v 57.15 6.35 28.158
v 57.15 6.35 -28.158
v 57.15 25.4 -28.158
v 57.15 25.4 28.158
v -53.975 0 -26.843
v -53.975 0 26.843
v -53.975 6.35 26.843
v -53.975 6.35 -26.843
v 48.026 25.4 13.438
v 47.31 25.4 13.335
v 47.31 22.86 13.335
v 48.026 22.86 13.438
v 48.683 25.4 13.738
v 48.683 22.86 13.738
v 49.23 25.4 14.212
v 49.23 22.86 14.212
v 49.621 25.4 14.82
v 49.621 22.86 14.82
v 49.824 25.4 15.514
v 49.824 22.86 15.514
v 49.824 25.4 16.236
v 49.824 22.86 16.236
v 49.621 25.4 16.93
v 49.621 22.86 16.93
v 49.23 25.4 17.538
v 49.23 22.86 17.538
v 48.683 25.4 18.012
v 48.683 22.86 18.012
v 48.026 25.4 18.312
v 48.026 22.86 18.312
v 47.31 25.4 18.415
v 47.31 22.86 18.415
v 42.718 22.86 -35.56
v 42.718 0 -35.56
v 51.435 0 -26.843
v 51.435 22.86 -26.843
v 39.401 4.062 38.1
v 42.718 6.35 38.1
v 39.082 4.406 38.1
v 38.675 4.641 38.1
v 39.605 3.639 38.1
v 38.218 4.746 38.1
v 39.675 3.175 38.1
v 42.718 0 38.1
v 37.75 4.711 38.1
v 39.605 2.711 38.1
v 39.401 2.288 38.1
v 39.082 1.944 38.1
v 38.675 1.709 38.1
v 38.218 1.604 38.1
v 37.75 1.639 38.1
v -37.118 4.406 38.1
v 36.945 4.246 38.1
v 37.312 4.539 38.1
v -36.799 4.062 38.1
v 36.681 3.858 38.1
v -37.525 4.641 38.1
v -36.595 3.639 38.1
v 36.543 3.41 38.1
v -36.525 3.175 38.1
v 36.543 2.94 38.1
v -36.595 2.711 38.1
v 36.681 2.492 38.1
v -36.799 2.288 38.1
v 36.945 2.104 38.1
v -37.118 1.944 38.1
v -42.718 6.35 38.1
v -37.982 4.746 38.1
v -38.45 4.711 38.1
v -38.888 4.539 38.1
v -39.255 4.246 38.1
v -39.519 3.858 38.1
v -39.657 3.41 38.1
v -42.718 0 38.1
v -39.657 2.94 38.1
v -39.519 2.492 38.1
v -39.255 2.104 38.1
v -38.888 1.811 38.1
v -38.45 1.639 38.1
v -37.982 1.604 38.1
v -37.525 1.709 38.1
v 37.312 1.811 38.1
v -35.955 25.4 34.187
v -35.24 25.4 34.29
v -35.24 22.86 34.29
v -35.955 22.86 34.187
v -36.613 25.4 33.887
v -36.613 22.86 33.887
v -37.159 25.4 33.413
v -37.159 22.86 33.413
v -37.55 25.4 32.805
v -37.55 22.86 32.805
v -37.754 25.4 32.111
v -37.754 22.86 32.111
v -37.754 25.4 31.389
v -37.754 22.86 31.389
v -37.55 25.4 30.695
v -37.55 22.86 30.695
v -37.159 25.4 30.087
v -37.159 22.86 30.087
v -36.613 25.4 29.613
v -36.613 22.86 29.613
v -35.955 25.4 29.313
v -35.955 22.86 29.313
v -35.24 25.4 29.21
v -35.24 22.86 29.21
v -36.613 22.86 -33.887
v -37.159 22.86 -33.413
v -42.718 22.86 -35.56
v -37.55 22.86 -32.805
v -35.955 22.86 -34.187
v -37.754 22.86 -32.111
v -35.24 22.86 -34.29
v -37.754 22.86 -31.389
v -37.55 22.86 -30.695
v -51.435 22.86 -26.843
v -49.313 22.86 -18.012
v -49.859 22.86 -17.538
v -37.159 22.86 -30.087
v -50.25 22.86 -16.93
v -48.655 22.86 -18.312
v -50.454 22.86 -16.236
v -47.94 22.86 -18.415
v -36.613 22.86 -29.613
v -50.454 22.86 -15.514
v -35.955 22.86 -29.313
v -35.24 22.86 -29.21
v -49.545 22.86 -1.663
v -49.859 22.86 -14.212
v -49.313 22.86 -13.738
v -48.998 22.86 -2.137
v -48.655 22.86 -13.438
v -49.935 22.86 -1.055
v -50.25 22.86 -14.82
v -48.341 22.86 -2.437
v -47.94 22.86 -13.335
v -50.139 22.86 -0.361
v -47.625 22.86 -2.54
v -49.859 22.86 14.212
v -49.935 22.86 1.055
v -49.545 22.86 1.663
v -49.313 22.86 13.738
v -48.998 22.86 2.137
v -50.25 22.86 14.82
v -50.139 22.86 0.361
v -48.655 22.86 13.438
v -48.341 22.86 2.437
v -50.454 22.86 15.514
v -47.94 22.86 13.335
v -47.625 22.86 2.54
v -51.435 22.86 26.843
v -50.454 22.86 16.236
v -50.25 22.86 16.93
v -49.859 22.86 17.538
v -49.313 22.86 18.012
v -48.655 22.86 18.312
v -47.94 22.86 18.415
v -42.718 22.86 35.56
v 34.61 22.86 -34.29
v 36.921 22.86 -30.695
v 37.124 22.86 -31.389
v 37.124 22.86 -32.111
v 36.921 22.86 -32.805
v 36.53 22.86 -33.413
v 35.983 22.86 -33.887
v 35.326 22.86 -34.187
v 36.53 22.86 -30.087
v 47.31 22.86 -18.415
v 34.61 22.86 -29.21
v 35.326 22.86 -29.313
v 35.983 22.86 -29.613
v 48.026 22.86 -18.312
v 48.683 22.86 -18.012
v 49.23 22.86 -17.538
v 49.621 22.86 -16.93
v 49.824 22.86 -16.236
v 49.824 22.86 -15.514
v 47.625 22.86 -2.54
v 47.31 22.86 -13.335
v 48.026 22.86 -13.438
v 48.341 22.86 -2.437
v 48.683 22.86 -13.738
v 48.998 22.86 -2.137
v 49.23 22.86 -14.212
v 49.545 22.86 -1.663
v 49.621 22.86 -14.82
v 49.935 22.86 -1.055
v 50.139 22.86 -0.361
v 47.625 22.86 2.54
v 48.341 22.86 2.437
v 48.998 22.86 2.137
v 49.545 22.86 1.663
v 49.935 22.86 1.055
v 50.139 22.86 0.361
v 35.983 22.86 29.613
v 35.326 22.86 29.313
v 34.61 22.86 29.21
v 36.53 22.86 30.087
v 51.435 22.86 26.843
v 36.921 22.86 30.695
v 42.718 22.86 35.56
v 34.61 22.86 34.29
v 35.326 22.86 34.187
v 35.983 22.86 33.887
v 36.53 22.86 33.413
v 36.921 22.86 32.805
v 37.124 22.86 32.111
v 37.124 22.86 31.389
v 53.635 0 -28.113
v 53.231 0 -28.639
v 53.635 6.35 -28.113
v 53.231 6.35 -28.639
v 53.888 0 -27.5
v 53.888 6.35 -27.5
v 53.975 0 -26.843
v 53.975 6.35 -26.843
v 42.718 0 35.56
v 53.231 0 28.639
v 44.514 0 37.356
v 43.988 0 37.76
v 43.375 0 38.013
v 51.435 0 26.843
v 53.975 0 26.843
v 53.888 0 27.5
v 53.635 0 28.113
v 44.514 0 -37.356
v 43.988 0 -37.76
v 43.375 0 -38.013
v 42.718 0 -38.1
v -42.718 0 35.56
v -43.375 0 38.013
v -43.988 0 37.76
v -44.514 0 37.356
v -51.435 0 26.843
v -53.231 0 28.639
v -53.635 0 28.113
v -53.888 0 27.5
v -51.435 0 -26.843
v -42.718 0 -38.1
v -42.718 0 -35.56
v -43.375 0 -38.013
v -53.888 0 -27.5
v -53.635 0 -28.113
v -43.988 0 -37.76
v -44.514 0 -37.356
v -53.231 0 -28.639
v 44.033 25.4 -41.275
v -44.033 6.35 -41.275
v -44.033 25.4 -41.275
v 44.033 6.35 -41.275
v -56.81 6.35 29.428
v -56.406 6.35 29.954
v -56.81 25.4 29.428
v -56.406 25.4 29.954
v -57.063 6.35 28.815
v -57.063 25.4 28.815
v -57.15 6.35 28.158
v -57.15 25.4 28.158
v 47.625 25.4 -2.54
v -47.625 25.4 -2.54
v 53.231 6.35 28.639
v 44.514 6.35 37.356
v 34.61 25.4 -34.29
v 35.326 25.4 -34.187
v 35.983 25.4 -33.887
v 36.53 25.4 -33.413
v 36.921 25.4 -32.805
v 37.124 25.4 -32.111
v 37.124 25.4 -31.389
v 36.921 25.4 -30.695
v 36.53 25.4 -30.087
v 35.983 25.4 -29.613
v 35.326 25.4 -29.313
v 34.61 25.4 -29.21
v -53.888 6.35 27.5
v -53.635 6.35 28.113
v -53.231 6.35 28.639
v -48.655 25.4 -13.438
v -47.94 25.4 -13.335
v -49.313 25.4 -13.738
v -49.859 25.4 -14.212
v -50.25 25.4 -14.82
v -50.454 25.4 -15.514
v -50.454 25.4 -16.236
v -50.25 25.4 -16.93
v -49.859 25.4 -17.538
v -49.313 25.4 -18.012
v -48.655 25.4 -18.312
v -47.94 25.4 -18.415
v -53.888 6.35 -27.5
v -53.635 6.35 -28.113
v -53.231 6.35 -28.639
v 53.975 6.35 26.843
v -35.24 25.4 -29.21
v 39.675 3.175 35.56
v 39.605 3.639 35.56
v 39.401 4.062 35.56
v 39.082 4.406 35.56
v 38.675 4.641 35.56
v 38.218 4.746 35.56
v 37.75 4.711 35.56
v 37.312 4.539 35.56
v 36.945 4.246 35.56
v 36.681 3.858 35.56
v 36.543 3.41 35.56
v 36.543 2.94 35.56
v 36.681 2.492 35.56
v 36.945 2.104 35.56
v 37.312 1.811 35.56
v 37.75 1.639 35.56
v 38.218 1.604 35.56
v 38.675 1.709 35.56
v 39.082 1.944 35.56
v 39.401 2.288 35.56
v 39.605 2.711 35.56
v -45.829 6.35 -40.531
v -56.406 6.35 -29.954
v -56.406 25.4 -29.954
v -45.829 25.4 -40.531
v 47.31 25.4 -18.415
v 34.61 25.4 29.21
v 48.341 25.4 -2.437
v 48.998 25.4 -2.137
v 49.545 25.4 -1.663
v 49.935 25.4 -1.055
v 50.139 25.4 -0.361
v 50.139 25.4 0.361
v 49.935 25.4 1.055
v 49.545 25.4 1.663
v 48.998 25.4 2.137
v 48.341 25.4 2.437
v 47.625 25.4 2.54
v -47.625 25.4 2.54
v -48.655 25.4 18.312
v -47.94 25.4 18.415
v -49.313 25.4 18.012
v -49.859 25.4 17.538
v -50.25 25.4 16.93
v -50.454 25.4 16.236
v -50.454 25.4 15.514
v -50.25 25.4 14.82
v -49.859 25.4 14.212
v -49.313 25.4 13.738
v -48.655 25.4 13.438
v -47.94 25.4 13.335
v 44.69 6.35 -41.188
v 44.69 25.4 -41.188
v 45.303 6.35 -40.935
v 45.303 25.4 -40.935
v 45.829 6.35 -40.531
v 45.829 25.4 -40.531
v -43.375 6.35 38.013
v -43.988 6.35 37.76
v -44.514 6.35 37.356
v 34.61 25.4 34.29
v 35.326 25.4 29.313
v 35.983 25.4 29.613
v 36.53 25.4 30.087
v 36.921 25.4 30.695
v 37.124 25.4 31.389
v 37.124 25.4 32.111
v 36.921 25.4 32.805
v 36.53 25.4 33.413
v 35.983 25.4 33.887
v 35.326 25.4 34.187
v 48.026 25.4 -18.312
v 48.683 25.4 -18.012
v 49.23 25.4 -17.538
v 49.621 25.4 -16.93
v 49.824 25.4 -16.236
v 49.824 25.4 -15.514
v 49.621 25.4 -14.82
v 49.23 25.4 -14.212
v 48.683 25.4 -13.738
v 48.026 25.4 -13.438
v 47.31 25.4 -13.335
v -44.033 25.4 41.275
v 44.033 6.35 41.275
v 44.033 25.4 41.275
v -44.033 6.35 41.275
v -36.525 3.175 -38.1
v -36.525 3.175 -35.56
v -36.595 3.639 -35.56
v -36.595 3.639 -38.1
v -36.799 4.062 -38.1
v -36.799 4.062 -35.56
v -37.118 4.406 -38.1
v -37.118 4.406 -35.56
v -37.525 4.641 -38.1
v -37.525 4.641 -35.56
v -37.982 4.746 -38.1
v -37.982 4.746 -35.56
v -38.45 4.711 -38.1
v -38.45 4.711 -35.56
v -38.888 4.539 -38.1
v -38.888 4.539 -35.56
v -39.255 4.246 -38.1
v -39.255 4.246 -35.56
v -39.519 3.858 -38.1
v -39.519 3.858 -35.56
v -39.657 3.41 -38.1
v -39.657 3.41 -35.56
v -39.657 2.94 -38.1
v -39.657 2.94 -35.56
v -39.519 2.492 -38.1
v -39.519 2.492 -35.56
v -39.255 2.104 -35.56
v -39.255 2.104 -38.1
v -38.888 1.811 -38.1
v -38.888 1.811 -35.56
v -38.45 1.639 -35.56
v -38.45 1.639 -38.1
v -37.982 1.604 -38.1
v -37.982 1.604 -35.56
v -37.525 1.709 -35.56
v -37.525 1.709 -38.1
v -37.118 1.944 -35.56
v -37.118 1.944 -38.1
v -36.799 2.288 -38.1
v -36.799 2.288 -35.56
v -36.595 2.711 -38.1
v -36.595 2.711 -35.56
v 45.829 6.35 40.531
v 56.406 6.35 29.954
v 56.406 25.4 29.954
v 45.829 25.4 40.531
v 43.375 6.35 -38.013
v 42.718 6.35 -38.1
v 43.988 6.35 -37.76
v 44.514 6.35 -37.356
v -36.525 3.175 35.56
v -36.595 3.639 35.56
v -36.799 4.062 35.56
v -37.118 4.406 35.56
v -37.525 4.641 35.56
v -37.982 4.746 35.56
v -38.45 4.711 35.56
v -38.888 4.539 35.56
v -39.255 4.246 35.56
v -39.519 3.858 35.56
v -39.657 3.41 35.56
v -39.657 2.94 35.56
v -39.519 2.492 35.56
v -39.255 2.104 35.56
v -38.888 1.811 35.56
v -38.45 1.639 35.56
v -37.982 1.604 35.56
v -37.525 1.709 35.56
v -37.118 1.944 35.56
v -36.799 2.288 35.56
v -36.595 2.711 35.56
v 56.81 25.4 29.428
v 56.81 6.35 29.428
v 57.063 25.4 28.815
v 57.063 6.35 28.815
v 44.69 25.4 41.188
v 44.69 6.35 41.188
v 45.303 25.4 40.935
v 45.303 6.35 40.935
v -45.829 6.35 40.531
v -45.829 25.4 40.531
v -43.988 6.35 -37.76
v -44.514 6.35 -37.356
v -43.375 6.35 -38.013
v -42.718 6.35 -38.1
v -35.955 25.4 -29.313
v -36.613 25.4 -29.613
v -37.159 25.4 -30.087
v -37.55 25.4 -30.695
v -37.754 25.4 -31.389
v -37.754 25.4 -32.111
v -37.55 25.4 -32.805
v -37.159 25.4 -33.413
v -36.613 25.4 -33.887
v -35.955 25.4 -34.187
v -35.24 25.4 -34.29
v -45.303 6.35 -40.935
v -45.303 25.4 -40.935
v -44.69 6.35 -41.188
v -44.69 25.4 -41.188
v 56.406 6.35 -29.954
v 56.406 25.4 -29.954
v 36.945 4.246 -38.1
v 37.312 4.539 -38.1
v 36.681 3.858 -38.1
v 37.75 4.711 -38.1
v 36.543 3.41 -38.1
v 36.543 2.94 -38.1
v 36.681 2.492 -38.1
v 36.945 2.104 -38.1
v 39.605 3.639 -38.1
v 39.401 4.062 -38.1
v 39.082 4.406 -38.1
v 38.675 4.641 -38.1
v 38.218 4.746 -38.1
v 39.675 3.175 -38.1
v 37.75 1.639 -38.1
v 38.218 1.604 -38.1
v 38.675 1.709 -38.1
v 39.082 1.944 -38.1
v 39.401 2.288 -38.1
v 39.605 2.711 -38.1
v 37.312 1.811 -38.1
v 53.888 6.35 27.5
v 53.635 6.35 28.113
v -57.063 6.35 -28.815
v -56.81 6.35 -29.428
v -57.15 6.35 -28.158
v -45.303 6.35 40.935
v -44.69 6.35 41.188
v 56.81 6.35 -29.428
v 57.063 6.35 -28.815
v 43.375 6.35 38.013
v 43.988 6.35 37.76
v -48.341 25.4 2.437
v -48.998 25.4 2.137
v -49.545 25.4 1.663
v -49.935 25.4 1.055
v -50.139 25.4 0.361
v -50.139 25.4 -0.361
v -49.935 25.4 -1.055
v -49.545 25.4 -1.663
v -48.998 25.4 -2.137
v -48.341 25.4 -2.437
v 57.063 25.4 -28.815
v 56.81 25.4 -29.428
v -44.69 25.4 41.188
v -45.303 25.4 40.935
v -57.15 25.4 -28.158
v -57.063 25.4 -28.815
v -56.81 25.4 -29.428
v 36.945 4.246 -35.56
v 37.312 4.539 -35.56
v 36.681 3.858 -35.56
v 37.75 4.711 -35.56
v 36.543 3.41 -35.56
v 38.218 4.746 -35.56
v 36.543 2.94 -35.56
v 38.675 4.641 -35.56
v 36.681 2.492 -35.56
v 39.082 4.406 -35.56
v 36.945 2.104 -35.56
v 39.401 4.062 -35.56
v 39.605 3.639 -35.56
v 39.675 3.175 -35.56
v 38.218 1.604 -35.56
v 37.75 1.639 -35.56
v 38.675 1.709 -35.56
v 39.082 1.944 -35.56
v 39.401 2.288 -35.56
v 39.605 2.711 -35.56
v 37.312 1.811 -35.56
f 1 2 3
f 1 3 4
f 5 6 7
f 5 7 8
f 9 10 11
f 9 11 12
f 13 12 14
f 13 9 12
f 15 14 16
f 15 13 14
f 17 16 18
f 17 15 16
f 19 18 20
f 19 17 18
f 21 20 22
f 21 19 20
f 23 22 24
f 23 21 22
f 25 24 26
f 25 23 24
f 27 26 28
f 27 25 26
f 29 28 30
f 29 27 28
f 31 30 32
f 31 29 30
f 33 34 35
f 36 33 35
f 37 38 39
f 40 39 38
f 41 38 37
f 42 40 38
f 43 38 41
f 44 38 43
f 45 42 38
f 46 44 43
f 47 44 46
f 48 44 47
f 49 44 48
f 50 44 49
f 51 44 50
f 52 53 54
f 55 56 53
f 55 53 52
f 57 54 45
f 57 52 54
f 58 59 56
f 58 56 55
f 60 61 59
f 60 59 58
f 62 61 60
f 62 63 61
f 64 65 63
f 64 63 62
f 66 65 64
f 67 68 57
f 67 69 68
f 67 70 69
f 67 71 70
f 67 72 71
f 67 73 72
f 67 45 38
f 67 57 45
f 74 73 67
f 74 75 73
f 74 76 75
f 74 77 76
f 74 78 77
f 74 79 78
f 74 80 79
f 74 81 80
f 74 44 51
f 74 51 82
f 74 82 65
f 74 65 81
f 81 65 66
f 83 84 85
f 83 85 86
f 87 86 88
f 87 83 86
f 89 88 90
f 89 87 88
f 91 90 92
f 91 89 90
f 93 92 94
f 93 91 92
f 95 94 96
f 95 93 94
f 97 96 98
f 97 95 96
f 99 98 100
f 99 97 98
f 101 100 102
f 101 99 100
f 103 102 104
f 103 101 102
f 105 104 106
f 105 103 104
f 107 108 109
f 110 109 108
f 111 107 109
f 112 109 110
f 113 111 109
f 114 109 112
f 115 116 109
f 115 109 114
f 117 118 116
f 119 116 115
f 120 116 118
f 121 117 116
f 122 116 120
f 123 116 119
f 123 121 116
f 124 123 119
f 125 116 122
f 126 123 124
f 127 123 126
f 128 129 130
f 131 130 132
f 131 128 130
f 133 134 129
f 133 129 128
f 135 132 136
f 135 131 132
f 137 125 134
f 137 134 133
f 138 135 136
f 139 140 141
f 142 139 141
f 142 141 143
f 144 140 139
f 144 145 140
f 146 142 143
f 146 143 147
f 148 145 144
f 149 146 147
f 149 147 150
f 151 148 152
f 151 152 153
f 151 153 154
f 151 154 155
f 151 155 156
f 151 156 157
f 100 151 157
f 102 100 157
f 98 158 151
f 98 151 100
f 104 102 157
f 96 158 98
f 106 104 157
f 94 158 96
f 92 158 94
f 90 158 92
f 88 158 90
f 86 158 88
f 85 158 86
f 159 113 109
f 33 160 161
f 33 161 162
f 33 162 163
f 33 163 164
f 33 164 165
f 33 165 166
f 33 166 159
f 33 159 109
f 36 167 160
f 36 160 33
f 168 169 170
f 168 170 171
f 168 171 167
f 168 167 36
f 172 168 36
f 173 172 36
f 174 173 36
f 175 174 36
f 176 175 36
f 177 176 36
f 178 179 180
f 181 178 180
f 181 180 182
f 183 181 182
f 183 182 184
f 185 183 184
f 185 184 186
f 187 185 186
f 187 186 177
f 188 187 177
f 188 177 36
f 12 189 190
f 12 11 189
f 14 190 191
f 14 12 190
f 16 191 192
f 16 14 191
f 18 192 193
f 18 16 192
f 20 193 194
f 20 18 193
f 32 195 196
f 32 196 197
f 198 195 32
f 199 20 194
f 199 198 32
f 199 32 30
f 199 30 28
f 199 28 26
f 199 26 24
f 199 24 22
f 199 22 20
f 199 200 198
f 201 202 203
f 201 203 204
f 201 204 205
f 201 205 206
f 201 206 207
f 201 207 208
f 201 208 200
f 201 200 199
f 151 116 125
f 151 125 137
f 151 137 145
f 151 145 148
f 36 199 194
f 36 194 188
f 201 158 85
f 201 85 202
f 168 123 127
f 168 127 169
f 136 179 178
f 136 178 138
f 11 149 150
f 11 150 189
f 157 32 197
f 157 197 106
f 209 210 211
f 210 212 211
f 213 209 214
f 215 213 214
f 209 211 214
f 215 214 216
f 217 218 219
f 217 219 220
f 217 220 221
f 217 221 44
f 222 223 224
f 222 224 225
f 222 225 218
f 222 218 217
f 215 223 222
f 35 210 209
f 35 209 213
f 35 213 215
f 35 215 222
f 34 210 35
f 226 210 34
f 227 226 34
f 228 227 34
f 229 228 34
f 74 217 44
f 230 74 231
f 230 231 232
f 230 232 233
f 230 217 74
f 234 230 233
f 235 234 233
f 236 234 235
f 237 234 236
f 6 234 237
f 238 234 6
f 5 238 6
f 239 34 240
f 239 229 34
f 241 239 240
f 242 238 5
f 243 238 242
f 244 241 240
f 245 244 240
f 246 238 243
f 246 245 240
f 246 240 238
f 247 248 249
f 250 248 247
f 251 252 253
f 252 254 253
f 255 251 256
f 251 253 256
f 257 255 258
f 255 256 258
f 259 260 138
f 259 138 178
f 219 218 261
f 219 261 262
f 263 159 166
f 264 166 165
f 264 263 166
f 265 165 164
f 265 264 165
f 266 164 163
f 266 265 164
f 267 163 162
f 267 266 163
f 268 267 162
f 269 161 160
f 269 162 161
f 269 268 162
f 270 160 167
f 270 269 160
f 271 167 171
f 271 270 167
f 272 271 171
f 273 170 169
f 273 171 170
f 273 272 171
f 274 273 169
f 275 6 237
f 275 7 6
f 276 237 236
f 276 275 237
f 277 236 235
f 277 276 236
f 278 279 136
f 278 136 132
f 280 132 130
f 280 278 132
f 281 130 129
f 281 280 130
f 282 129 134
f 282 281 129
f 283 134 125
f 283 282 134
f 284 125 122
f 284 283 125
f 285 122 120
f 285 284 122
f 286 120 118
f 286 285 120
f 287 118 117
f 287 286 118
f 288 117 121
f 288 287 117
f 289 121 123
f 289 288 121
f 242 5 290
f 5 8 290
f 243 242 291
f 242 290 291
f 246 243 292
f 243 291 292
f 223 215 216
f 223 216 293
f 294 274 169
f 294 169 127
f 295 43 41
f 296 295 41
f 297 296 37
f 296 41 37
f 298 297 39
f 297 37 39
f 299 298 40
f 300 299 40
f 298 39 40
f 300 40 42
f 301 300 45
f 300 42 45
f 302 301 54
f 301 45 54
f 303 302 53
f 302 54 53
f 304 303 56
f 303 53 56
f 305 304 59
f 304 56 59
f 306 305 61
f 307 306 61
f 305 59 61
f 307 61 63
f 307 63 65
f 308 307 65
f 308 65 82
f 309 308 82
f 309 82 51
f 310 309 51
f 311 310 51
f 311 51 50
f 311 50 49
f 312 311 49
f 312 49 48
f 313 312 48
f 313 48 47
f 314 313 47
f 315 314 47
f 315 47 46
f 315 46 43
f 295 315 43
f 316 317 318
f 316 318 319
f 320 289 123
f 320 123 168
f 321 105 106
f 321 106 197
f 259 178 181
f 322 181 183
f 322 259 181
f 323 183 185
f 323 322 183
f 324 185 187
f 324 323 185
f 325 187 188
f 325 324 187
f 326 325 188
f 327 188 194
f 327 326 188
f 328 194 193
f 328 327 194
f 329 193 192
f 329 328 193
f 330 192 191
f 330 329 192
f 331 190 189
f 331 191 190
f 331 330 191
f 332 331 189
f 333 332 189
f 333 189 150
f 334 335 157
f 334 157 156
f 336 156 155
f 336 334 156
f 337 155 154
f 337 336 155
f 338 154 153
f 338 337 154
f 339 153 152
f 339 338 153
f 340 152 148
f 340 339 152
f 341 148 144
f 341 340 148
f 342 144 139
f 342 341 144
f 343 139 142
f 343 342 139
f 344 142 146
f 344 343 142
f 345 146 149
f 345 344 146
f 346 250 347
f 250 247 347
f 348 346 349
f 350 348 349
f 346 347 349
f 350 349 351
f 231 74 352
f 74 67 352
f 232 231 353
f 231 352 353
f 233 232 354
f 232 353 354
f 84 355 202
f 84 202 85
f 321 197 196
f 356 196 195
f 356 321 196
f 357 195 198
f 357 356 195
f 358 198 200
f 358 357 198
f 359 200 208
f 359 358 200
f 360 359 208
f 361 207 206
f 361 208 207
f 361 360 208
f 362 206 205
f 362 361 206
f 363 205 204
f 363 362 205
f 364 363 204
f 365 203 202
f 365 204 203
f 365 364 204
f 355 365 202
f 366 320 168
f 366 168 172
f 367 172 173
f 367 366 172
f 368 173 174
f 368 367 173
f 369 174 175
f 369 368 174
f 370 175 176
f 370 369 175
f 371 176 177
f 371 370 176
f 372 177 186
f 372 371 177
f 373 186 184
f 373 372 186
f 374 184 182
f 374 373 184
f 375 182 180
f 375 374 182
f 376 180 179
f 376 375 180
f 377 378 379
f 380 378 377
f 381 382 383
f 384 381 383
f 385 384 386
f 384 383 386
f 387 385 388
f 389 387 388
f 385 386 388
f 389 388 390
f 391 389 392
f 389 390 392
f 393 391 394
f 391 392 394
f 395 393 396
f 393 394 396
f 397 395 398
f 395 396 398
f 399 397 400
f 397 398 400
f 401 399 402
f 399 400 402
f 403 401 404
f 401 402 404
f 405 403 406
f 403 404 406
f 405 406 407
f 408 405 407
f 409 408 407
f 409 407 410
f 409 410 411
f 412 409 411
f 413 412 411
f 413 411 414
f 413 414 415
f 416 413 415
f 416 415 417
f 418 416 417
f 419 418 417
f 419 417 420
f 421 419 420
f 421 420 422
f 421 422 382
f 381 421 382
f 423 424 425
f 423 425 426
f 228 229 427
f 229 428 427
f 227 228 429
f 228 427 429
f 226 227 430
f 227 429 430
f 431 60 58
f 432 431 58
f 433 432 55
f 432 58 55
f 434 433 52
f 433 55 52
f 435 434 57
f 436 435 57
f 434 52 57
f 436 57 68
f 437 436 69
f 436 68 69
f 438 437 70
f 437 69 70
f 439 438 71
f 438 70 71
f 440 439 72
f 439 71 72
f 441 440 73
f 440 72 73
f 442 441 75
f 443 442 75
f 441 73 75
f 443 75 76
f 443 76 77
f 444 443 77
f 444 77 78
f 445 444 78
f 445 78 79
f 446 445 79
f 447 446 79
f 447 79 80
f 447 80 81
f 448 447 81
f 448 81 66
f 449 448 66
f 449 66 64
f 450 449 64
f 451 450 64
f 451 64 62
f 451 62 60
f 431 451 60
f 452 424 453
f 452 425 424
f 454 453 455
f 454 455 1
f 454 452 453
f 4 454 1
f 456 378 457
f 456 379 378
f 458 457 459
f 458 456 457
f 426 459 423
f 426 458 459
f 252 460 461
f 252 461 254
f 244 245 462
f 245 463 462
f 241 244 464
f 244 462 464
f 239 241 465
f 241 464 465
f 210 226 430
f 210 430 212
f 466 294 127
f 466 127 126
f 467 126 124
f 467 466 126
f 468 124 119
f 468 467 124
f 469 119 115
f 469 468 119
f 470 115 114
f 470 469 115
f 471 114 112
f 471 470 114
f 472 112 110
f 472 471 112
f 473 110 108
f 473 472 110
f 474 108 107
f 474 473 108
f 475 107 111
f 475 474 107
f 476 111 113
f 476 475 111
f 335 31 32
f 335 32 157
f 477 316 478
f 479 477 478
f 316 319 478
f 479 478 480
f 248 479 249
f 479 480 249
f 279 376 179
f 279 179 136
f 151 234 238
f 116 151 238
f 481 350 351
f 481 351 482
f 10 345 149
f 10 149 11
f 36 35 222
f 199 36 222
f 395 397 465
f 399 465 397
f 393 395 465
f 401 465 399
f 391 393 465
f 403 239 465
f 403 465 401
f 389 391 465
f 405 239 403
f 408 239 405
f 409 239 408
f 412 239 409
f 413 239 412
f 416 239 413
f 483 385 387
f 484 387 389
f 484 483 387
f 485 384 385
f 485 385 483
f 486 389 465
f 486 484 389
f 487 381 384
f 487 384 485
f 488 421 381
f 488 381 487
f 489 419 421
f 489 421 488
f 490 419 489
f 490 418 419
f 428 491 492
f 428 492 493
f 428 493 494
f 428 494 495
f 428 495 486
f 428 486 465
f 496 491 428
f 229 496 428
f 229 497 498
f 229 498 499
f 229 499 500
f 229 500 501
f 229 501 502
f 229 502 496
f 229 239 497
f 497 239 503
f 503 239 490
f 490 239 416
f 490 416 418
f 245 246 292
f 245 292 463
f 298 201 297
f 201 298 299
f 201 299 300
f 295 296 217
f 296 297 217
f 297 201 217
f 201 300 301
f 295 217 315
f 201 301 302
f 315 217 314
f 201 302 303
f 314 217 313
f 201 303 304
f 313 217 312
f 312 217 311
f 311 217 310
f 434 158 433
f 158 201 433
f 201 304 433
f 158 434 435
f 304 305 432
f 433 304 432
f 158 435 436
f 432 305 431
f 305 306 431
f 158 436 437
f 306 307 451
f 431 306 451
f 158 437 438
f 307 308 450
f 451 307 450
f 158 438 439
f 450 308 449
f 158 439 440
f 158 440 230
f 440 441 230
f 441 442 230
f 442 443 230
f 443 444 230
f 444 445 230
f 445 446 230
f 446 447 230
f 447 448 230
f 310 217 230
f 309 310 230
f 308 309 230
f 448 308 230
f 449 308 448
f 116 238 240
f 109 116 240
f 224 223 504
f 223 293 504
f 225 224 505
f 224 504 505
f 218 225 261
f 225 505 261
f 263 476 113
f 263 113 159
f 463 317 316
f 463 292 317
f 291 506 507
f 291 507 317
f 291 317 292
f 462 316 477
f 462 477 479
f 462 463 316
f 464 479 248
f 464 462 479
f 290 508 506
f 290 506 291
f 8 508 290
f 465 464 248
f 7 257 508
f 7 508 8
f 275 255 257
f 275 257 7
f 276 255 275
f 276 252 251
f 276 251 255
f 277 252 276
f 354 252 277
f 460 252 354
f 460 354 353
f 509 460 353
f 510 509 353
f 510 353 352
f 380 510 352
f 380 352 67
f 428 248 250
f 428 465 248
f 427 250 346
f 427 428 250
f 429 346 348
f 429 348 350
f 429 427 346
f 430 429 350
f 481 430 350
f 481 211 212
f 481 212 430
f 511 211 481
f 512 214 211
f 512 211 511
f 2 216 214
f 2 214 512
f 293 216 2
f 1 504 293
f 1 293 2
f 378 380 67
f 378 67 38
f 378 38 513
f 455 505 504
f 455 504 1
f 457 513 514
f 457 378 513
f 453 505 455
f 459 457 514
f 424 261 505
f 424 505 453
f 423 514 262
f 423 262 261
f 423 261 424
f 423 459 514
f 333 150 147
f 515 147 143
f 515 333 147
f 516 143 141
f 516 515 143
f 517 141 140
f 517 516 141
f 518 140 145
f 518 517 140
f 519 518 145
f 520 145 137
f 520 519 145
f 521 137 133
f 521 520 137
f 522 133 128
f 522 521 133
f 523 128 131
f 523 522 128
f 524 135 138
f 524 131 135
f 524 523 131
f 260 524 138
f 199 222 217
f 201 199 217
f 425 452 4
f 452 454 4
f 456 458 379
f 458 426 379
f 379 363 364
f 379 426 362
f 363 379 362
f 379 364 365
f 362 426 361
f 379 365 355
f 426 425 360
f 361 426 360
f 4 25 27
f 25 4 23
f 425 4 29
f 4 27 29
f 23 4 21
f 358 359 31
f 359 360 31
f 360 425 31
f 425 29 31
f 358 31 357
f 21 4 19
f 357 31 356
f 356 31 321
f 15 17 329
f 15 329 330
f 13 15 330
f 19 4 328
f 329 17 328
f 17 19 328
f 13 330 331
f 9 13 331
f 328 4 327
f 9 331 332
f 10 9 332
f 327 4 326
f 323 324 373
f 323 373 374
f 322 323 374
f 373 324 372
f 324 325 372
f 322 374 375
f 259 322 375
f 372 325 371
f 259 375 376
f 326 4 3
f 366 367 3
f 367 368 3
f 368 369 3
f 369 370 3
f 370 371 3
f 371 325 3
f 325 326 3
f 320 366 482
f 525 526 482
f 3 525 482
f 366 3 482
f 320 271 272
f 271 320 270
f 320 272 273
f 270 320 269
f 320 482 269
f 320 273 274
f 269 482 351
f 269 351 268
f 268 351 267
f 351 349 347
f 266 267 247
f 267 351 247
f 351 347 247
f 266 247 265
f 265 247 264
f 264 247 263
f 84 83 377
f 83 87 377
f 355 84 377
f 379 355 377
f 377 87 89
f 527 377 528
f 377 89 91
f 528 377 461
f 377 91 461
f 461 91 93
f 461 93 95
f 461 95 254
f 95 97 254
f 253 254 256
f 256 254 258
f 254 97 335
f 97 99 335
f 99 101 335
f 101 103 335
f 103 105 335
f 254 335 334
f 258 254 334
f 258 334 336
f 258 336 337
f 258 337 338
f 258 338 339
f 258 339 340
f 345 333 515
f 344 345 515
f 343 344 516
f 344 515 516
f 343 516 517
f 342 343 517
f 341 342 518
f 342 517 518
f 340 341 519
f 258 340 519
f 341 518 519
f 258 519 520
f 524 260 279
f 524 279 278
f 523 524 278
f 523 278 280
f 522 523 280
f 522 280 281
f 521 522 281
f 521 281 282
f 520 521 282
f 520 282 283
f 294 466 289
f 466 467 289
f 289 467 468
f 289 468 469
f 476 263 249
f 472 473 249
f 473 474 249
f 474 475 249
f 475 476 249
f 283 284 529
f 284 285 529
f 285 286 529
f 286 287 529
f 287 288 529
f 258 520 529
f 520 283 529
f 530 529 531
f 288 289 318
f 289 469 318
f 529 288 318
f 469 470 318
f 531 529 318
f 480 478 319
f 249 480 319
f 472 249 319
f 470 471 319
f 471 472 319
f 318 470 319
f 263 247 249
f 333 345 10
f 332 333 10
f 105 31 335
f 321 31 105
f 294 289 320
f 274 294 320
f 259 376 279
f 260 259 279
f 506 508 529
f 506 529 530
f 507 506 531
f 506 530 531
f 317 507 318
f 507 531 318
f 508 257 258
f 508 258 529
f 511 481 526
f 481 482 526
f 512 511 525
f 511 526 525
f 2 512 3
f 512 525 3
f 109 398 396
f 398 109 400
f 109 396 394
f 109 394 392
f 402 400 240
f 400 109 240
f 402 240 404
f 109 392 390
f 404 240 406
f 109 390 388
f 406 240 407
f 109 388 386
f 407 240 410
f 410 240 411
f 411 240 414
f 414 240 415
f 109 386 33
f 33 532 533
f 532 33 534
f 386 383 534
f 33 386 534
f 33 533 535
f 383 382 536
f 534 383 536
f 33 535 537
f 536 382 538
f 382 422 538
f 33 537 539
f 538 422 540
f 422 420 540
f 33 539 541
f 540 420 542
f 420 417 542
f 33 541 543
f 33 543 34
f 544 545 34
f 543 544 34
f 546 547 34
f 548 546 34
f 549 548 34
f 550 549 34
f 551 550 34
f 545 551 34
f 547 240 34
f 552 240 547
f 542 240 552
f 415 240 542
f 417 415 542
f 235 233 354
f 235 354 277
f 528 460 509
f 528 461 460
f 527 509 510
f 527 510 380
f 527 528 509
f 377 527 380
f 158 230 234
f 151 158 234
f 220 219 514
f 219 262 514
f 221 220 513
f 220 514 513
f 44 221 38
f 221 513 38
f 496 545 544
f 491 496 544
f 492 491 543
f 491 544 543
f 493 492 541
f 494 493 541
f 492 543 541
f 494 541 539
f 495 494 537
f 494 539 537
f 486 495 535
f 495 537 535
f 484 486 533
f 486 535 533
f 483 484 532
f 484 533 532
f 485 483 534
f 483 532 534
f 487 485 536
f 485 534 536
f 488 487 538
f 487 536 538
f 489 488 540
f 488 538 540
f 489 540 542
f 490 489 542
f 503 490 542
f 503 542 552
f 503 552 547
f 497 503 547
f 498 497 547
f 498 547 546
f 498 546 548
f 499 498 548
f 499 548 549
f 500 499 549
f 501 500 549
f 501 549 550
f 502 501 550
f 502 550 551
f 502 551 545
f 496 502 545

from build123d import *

# Parameters (mm, degrees)
BOSS_EXTRUDE1_DEPTH = 25.4
CUT_EXTRUDE1_DEPTH  = 6.35
CUT_EXTRUDE2_DEPTH  = 22.86
SKETCH4_R           = 1.575
CUT_EXTRUDE3_DEPTH  = 102.052823439
CUT_EXTRUDE4_DEPTH  = 75.93269063
FILLET1_R           = 2.54


with BuildPart() as part:
    # Sketch1 → Boss-Extrude1 (new body)
    with BuildSketch(Plane(origin=(0, 0, 0), x_dir=(1, 0, 0), z_dir=(0, 1, 0))):
        Polygon((-45.085, -41.275), (-57.15, -29.21), (-57.15, 29.21), (-45.085, 41.275), (45.085, 41.275), (57.15, 29.21), (57.15, -29.21), (45.085, -41.275), align=None)
    extrude(amount=BOSS_EXTRUDE1_DEPTH)

    # Sketch2 → Cut-Extrude1 (cut)
    with BuildSketch(Plane.XZ):
        Polygon((-57.15, 29.21), (-57.15, -29.21), (-45.085, -41.275), (45.085, -41.275), (57.15, -29.21), (57.15, 29.21), (45.085, 41.275), (-45.085, 41.275), align=None)
        Polygon((-53.975, 27.894871939), (-53.975, -27.894871939), (-43.769871939, -38.1), (43.769871939, -38.1), (53.975, -27.894871939), (53.975, 27.894871939), (43.769871939, 38.1), (-43.769871939, 38.1), align=None, mode=Mode.SUBTRACT)
    extrude(amount=-CUT_EXTRUDE1_DEPTH, mode=Mode.SUBTRACT)

    # Sketch3 → Cut-Extrude2 (cut)
    with BuildSketch(Plane.XZ):
        Polygon((-51.435, 26.842769491), (-51.435, -26.842769491), (-42.717769491, -35.56), (42.717769491, -35.56), (51.435, -26.842769491), (51.435, 26.842769491), (42.717769491, 35.56), (-42.717769491, 35.56), align=None)
    extrude(amount=-CUT_EXTRUDE2_DEPTH, mode=Mode.SUBTRACT)

    # Sketch4 → Cut-Extrude3 (cut, through all)
    with BuildSketch(Plane.XY.offset(38.1)):
        with Locations((-38.1, 3.175)):
            Circle(SKETCH4_R)
        with Locations((38.1, 3.175)):
            Circle(SKETCH4_R)
    extrude(amount=-CUT_EXTRUDE3_DEPTH, mode=Mode.SUBTRACT)

    # Sketch5 → Cut-Extrude4 (cut, through all)
    with BuildSketch(Plane(origin=(0, 25.4, 0), x_dir=(1, 0, 0), z_dir=(0, 1, 0))):
        with BuildLine():
            Line((-35.239850105, 34.29), (34.610149895, 34.29))
            ThreePointArc((34.610149895, 34.29), (37.150149895, 31.75), (34.610149895, 29.21))
            Line((34.610149895, 29.21), (-35.239850105, 29.21))
            ThreePointArc((-35.239850105, 29.21), (-37.779850105, 31.75), (-35.239850105, 34.29))
        make_face()
        with BuildLine():
            Line((-47.625, 2.54), (47.625, 2.54))
            ThreePointArc((47.625, 2.54), (50.165, 0), (47.625, -2.54))
            Line((47.625, -2.54), (-47.625, -2.54))
            ThreePointArc((-47.625, -2.54), (-50.165, 0), (-47.625, 2.54))
        make_face()
        with BuildLine():
            Line((-35.239850105, -29.21), (34.610149895, -29.21))
            ThreePointArc((34.610149895, -29.21), (37.150149895, -31.75), (34.610149895, -34.29))
            Line((34.610149895, -34.29), (-35.239850105, -34.29))
            ThreePointArc((-35.239850105, -34.29), (-37.779850105, -31.75), (-35.239850105, -29.21))
        make_face()
        with BuildLine():
            Line((-47.939850105, -13.335), (47.310149895, -13.335))
            ThreePointArc((47.310149895, -13.335), (49.850149895, -15.875), (47.310149895, -18.415))
            Line((47.310149895, -18.415), (-47.939850105, -18.415))
            ThreePointArc((-47.939850105, -18.415), (-50.479850105, -15.875), (-47.939850105, -13.335))
        make_face()
        with BuildLine():
            Line((-47.939850105, 18.415), (47.310149895, 18.415))
            ThreePointArc((47.310149895, 18.415), (49.850149895, 15.875), (47.310149895, 13.335))
            Line((47.310149895, 13.335), (-47.939850105, 13.335))
            ThreePointArc((-47.939850105, 13.335), (-50.479850105, 15.875), (-47.939850105, 18.415))
        make_face()
    extrude(amount=-CUT_EXTRUDE4_DEPTH, mode=Mode.SUBTRACT)

    # Fillet1
    fillet1_edges = [part.edges().sort_by_distance(p)[0] for p in [
        (-45.085, 15.875, 41.275),
        (-57.15, 15.875, 29.21),
        (-57.15, 15.875, -29.21),
        (-45.085, 15.875, -41.275),
        (45.085, 15.875, -41.275),
        (57.15, 15.875, -29.21),
        (57.15, 15.875, 29.21),
        (45.085, 15.875, 41.275),
        (-43.769871939, 3.175, 38.1),
        (43.769871939, 3.175, 38.1),
        (53.975, 3.175, 27.894871939),
        (53.975, 3.175, -27.894871939),
        (43.769871939, 3.175, -38.1),
        (-43.769871939, 3.175, -38.1),
        (-53.975, 3.175, -27.894871939),
        (-53.975, 3.175, 27.894871939),
    ]]
    fillet(fillet1_edges, radius=FILLET1_R)


solid = part.part
